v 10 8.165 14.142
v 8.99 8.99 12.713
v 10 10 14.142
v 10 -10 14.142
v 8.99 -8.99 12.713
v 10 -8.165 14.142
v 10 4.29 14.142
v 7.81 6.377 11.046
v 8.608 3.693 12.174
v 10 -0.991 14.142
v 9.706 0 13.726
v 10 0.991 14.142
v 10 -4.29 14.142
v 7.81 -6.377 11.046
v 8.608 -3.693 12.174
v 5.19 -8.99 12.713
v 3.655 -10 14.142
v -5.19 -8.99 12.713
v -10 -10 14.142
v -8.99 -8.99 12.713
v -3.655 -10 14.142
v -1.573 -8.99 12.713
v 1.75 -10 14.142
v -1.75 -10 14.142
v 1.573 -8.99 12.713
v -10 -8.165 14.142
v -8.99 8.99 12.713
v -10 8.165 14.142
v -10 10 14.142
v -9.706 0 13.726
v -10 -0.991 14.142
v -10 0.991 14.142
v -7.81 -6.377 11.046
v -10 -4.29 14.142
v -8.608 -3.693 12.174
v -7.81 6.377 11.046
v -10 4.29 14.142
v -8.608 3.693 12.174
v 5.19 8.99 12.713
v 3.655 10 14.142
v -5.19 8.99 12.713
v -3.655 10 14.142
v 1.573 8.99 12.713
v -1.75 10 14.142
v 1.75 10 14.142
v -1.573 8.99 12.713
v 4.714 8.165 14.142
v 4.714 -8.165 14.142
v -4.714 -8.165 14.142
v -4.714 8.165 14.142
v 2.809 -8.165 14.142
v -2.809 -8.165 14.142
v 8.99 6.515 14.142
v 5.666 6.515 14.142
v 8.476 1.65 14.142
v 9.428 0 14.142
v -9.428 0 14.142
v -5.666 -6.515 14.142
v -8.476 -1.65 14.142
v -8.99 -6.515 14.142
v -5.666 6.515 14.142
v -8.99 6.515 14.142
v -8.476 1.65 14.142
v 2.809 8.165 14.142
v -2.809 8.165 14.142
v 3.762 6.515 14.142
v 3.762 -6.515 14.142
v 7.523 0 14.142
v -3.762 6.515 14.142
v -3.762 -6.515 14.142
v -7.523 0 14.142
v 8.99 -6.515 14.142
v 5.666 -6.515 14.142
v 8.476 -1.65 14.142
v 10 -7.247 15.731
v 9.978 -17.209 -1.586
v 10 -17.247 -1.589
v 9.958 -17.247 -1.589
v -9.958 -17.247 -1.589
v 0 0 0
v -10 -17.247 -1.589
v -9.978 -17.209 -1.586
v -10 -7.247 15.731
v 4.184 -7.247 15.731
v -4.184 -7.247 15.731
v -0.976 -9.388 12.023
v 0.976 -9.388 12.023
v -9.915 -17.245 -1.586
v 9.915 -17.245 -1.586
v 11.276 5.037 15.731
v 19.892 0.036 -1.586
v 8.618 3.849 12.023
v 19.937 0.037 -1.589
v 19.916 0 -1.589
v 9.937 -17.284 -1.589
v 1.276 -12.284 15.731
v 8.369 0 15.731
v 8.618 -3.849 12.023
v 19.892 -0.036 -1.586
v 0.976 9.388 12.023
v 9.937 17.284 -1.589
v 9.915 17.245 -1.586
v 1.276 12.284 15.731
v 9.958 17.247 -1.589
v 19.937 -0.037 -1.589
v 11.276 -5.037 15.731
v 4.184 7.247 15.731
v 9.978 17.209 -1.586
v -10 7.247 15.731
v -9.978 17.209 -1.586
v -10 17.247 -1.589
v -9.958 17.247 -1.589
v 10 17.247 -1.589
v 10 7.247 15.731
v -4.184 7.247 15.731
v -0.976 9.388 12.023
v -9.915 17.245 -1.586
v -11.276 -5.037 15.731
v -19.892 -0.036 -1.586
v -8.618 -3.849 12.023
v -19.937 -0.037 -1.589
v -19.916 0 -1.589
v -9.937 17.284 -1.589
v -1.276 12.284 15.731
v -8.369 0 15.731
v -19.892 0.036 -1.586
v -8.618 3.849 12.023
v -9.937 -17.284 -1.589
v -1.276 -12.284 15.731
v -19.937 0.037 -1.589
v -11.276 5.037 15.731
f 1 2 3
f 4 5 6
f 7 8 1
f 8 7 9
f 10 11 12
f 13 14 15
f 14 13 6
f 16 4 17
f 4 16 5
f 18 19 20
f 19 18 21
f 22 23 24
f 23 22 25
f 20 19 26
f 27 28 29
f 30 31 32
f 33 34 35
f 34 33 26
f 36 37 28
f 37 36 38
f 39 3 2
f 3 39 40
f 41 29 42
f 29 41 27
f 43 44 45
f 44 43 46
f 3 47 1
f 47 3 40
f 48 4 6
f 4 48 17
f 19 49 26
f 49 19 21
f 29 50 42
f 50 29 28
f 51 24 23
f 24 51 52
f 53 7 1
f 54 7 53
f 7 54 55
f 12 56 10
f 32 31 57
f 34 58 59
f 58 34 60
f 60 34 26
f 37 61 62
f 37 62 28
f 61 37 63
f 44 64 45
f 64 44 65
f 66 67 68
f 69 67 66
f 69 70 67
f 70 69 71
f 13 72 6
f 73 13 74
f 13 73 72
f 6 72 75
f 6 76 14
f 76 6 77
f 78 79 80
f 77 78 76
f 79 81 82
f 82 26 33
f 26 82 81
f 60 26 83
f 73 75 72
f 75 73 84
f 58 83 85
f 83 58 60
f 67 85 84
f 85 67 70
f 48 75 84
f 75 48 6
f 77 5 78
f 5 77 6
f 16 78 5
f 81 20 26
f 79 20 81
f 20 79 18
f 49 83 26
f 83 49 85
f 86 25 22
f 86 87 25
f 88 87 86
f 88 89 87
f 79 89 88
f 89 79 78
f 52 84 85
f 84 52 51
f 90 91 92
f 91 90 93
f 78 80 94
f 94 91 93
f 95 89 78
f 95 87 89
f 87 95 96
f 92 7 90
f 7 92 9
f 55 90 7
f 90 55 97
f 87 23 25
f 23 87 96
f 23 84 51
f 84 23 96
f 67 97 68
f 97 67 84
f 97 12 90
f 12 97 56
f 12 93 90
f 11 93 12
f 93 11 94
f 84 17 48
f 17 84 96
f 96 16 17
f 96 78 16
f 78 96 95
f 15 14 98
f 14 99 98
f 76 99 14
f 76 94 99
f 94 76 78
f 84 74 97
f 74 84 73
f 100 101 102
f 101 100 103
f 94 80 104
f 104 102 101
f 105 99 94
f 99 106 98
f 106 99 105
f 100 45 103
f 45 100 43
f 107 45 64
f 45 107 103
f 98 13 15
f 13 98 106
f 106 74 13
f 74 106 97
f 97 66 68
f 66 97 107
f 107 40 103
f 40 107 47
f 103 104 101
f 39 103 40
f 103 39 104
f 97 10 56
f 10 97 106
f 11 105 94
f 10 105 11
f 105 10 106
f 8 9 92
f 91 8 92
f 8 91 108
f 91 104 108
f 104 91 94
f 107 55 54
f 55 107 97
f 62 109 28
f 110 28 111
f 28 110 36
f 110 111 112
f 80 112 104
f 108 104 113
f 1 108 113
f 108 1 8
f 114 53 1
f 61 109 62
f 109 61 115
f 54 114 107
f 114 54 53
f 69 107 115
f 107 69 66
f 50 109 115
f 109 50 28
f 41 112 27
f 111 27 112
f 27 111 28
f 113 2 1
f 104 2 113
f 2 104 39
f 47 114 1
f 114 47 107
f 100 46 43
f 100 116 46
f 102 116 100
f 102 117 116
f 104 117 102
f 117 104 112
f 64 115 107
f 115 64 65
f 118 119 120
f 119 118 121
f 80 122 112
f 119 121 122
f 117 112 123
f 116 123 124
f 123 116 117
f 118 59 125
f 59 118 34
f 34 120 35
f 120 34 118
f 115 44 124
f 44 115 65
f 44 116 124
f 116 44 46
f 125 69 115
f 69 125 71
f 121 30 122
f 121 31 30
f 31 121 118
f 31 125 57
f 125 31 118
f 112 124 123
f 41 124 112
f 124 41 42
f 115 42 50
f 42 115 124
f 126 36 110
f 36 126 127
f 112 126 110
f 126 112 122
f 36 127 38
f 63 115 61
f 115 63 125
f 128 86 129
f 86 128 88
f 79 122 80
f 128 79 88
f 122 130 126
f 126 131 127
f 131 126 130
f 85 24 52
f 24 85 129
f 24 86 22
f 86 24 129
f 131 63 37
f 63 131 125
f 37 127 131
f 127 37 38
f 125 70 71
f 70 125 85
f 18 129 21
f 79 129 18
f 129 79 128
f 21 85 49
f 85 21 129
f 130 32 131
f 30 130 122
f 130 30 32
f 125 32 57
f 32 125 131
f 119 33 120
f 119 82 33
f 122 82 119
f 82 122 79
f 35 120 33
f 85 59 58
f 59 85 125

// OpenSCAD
 
 module vl53l7(alpha=0, beta=0, c="red"){
     rotate([alpha,0,beta]){
 color (c, alpha=0.3) polyhedron(
  points=[ [10,10,sqrt(200)],[10,-10,sqrt(200)],[-10,-10,sqrt(200)],[-10,10,sqrt(200)], // the four points at base
           [0,0,0]  ],                                 // the apex point 
  faces=[ [0,1,4],[1,2,4],[2,3,4],[3,0,4],              // each triangle side
              [1,0,3],[2,1,3] ]                         // two triangles for square base
 );

 }
 }
 
 vl53l7(0,0, "yellow");
 vl53l7(60,0, "red");
 vl53l7(60,60, "green");
 vl53l7(60,120, "blue");
 vl53l7(60,180, "red");
 vl53l7(60,240, "green");
 vl53l7(60,300,"blue");
 color("black", alpha=0.1) circle(20);

 
 
